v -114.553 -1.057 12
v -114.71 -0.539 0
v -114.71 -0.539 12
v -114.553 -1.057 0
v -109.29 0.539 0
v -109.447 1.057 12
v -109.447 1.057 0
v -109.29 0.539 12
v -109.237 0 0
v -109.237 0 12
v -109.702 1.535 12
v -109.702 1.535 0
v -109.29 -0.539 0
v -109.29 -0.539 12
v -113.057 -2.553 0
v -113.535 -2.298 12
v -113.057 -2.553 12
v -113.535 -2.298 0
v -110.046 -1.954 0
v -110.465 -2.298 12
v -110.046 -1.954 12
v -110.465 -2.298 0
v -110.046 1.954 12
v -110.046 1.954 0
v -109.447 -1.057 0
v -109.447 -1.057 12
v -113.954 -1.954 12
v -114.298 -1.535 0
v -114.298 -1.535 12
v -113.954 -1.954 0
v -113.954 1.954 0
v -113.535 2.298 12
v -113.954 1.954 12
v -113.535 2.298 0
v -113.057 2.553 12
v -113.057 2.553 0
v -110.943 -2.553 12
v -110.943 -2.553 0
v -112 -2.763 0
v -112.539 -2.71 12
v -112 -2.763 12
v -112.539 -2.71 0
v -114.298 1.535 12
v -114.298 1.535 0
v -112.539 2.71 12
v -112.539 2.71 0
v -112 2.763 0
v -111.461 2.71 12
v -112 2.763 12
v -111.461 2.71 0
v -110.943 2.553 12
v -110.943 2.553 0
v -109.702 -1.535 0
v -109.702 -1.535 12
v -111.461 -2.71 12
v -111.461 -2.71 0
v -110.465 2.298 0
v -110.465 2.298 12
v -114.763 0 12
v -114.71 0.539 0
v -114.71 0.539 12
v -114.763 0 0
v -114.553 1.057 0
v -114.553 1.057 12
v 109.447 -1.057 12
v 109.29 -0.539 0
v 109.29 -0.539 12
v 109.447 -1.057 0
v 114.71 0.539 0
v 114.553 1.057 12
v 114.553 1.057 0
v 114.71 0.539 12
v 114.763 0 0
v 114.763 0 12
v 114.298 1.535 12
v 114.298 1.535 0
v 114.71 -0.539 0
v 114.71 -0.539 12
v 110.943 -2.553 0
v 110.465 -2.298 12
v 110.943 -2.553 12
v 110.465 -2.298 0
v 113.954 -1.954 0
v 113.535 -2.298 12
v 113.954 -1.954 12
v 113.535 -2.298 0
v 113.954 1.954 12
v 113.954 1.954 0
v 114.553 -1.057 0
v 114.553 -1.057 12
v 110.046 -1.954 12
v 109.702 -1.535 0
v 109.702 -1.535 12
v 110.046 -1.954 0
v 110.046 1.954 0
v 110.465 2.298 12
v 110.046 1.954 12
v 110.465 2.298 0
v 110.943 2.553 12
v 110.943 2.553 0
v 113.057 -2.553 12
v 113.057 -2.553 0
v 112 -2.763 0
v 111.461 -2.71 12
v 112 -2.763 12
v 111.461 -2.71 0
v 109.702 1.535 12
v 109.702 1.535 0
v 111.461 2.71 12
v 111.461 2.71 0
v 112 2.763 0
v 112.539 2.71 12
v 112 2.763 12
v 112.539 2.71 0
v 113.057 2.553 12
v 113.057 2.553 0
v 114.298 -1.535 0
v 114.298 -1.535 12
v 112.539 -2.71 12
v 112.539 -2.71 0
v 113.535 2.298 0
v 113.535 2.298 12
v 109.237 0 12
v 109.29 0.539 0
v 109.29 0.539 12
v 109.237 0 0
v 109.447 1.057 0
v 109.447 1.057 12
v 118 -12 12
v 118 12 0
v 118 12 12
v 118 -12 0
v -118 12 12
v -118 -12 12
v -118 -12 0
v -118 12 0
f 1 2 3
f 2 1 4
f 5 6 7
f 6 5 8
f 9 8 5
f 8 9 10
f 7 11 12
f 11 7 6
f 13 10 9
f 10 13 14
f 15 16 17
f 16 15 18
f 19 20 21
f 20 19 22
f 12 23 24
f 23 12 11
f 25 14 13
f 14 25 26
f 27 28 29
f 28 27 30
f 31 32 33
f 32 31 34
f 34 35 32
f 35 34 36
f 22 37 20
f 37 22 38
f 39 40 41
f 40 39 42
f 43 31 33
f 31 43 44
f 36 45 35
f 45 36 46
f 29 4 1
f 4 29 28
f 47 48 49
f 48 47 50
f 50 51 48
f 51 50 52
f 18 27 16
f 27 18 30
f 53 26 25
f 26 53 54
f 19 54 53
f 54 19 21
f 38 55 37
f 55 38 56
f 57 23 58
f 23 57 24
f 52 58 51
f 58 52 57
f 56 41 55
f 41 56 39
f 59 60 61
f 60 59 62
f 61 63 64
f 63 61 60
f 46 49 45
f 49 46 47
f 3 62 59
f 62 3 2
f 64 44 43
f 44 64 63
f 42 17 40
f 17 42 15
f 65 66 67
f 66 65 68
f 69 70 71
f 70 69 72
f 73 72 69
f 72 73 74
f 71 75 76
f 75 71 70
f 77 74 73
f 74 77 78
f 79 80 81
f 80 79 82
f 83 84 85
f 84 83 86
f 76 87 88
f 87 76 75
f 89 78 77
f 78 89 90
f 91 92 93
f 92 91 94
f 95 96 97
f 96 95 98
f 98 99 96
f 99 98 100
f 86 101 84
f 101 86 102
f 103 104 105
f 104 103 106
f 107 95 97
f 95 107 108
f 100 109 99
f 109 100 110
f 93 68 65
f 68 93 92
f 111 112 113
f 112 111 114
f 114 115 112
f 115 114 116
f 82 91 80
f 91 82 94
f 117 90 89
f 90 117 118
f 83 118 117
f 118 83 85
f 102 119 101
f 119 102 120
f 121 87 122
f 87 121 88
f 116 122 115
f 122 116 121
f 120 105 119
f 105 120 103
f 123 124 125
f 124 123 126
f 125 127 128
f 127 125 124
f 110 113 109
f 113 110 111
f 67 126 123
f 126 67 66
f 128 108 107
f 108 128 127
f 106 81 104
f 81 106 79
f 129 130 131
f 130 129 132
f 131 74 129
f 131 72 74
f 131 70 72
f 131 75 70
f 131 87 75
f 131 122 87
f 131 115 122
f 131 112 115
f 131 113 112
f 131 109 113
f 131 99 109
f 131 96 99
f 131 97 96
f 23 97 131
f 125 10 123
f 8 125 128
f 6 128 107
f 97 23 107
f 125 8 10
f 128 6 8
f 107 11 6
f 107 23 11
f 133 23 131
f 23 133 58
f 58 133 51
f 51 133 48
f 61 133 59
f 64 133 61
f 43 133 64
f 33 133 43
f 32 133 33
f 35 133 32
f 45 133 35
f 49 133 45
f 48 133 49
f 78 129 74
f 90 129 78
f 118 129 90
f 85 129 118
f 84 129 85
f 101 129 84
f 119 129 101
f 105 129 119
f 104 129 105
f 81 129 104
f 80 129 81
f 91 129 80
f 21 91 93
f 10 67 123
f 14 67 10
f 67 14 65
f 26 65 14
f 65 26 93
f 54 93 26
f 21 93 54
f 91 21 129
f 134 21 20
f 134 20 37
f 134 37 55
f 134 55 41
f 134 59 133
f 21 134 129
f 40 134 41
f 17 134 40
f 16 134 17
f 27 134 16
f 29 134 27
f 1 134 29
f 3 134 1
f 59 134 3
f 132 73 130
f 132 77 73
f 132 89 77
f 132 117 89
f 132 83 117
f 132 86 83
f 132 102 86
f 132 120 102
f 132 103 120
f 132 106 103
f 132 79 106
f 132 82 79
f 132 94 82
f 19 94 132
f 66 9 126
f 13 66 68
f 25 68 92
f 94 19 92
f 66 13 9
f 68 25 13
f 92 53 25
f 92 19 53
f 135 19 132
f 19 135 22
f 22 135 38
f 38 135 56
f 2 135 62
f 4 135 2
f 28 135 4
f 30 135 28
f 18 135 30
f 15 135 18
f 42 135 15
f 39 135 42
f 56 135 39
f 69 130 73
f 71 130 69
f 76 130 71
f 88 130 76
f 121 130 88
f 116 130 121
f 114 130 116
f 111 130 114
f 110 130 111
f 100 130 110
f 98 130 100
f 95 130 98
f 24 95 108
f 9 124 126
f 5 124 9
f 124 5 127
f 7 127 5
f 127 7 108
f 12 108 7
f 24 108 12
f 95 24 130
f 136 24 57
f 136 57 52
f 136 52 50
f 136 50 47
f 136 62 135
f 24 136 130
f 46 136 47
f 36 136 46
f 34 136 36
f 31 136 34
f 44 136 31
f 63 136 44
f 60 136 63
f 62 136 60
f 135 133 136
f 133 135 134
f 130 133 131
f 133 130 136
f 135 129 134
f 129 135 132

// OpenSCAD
// Two identical upper clamp bars. Flat underside Z=0. mm.
/* [Dimensions] */
width=236;
depth=24;
thickness=12;
rod_pitch=224;
rod_hole=5.5;
$fn=48;
assert((width-rod_pitch-rod_hole)/2>=3);
assert(depth>=20 && thickness>=10);
module hole(d,h){cylinder(d=d/cos(180/32),h=h,$fn=32);}
difference(){
 translate([-width/2,-depth/2,0])cube([width,depth,thickness]);
 for(x=[-rod_pitch/2,rod_pitch/2])translate([x,0,-0.02])hole(rod_hole,thickness+0.04);
}
